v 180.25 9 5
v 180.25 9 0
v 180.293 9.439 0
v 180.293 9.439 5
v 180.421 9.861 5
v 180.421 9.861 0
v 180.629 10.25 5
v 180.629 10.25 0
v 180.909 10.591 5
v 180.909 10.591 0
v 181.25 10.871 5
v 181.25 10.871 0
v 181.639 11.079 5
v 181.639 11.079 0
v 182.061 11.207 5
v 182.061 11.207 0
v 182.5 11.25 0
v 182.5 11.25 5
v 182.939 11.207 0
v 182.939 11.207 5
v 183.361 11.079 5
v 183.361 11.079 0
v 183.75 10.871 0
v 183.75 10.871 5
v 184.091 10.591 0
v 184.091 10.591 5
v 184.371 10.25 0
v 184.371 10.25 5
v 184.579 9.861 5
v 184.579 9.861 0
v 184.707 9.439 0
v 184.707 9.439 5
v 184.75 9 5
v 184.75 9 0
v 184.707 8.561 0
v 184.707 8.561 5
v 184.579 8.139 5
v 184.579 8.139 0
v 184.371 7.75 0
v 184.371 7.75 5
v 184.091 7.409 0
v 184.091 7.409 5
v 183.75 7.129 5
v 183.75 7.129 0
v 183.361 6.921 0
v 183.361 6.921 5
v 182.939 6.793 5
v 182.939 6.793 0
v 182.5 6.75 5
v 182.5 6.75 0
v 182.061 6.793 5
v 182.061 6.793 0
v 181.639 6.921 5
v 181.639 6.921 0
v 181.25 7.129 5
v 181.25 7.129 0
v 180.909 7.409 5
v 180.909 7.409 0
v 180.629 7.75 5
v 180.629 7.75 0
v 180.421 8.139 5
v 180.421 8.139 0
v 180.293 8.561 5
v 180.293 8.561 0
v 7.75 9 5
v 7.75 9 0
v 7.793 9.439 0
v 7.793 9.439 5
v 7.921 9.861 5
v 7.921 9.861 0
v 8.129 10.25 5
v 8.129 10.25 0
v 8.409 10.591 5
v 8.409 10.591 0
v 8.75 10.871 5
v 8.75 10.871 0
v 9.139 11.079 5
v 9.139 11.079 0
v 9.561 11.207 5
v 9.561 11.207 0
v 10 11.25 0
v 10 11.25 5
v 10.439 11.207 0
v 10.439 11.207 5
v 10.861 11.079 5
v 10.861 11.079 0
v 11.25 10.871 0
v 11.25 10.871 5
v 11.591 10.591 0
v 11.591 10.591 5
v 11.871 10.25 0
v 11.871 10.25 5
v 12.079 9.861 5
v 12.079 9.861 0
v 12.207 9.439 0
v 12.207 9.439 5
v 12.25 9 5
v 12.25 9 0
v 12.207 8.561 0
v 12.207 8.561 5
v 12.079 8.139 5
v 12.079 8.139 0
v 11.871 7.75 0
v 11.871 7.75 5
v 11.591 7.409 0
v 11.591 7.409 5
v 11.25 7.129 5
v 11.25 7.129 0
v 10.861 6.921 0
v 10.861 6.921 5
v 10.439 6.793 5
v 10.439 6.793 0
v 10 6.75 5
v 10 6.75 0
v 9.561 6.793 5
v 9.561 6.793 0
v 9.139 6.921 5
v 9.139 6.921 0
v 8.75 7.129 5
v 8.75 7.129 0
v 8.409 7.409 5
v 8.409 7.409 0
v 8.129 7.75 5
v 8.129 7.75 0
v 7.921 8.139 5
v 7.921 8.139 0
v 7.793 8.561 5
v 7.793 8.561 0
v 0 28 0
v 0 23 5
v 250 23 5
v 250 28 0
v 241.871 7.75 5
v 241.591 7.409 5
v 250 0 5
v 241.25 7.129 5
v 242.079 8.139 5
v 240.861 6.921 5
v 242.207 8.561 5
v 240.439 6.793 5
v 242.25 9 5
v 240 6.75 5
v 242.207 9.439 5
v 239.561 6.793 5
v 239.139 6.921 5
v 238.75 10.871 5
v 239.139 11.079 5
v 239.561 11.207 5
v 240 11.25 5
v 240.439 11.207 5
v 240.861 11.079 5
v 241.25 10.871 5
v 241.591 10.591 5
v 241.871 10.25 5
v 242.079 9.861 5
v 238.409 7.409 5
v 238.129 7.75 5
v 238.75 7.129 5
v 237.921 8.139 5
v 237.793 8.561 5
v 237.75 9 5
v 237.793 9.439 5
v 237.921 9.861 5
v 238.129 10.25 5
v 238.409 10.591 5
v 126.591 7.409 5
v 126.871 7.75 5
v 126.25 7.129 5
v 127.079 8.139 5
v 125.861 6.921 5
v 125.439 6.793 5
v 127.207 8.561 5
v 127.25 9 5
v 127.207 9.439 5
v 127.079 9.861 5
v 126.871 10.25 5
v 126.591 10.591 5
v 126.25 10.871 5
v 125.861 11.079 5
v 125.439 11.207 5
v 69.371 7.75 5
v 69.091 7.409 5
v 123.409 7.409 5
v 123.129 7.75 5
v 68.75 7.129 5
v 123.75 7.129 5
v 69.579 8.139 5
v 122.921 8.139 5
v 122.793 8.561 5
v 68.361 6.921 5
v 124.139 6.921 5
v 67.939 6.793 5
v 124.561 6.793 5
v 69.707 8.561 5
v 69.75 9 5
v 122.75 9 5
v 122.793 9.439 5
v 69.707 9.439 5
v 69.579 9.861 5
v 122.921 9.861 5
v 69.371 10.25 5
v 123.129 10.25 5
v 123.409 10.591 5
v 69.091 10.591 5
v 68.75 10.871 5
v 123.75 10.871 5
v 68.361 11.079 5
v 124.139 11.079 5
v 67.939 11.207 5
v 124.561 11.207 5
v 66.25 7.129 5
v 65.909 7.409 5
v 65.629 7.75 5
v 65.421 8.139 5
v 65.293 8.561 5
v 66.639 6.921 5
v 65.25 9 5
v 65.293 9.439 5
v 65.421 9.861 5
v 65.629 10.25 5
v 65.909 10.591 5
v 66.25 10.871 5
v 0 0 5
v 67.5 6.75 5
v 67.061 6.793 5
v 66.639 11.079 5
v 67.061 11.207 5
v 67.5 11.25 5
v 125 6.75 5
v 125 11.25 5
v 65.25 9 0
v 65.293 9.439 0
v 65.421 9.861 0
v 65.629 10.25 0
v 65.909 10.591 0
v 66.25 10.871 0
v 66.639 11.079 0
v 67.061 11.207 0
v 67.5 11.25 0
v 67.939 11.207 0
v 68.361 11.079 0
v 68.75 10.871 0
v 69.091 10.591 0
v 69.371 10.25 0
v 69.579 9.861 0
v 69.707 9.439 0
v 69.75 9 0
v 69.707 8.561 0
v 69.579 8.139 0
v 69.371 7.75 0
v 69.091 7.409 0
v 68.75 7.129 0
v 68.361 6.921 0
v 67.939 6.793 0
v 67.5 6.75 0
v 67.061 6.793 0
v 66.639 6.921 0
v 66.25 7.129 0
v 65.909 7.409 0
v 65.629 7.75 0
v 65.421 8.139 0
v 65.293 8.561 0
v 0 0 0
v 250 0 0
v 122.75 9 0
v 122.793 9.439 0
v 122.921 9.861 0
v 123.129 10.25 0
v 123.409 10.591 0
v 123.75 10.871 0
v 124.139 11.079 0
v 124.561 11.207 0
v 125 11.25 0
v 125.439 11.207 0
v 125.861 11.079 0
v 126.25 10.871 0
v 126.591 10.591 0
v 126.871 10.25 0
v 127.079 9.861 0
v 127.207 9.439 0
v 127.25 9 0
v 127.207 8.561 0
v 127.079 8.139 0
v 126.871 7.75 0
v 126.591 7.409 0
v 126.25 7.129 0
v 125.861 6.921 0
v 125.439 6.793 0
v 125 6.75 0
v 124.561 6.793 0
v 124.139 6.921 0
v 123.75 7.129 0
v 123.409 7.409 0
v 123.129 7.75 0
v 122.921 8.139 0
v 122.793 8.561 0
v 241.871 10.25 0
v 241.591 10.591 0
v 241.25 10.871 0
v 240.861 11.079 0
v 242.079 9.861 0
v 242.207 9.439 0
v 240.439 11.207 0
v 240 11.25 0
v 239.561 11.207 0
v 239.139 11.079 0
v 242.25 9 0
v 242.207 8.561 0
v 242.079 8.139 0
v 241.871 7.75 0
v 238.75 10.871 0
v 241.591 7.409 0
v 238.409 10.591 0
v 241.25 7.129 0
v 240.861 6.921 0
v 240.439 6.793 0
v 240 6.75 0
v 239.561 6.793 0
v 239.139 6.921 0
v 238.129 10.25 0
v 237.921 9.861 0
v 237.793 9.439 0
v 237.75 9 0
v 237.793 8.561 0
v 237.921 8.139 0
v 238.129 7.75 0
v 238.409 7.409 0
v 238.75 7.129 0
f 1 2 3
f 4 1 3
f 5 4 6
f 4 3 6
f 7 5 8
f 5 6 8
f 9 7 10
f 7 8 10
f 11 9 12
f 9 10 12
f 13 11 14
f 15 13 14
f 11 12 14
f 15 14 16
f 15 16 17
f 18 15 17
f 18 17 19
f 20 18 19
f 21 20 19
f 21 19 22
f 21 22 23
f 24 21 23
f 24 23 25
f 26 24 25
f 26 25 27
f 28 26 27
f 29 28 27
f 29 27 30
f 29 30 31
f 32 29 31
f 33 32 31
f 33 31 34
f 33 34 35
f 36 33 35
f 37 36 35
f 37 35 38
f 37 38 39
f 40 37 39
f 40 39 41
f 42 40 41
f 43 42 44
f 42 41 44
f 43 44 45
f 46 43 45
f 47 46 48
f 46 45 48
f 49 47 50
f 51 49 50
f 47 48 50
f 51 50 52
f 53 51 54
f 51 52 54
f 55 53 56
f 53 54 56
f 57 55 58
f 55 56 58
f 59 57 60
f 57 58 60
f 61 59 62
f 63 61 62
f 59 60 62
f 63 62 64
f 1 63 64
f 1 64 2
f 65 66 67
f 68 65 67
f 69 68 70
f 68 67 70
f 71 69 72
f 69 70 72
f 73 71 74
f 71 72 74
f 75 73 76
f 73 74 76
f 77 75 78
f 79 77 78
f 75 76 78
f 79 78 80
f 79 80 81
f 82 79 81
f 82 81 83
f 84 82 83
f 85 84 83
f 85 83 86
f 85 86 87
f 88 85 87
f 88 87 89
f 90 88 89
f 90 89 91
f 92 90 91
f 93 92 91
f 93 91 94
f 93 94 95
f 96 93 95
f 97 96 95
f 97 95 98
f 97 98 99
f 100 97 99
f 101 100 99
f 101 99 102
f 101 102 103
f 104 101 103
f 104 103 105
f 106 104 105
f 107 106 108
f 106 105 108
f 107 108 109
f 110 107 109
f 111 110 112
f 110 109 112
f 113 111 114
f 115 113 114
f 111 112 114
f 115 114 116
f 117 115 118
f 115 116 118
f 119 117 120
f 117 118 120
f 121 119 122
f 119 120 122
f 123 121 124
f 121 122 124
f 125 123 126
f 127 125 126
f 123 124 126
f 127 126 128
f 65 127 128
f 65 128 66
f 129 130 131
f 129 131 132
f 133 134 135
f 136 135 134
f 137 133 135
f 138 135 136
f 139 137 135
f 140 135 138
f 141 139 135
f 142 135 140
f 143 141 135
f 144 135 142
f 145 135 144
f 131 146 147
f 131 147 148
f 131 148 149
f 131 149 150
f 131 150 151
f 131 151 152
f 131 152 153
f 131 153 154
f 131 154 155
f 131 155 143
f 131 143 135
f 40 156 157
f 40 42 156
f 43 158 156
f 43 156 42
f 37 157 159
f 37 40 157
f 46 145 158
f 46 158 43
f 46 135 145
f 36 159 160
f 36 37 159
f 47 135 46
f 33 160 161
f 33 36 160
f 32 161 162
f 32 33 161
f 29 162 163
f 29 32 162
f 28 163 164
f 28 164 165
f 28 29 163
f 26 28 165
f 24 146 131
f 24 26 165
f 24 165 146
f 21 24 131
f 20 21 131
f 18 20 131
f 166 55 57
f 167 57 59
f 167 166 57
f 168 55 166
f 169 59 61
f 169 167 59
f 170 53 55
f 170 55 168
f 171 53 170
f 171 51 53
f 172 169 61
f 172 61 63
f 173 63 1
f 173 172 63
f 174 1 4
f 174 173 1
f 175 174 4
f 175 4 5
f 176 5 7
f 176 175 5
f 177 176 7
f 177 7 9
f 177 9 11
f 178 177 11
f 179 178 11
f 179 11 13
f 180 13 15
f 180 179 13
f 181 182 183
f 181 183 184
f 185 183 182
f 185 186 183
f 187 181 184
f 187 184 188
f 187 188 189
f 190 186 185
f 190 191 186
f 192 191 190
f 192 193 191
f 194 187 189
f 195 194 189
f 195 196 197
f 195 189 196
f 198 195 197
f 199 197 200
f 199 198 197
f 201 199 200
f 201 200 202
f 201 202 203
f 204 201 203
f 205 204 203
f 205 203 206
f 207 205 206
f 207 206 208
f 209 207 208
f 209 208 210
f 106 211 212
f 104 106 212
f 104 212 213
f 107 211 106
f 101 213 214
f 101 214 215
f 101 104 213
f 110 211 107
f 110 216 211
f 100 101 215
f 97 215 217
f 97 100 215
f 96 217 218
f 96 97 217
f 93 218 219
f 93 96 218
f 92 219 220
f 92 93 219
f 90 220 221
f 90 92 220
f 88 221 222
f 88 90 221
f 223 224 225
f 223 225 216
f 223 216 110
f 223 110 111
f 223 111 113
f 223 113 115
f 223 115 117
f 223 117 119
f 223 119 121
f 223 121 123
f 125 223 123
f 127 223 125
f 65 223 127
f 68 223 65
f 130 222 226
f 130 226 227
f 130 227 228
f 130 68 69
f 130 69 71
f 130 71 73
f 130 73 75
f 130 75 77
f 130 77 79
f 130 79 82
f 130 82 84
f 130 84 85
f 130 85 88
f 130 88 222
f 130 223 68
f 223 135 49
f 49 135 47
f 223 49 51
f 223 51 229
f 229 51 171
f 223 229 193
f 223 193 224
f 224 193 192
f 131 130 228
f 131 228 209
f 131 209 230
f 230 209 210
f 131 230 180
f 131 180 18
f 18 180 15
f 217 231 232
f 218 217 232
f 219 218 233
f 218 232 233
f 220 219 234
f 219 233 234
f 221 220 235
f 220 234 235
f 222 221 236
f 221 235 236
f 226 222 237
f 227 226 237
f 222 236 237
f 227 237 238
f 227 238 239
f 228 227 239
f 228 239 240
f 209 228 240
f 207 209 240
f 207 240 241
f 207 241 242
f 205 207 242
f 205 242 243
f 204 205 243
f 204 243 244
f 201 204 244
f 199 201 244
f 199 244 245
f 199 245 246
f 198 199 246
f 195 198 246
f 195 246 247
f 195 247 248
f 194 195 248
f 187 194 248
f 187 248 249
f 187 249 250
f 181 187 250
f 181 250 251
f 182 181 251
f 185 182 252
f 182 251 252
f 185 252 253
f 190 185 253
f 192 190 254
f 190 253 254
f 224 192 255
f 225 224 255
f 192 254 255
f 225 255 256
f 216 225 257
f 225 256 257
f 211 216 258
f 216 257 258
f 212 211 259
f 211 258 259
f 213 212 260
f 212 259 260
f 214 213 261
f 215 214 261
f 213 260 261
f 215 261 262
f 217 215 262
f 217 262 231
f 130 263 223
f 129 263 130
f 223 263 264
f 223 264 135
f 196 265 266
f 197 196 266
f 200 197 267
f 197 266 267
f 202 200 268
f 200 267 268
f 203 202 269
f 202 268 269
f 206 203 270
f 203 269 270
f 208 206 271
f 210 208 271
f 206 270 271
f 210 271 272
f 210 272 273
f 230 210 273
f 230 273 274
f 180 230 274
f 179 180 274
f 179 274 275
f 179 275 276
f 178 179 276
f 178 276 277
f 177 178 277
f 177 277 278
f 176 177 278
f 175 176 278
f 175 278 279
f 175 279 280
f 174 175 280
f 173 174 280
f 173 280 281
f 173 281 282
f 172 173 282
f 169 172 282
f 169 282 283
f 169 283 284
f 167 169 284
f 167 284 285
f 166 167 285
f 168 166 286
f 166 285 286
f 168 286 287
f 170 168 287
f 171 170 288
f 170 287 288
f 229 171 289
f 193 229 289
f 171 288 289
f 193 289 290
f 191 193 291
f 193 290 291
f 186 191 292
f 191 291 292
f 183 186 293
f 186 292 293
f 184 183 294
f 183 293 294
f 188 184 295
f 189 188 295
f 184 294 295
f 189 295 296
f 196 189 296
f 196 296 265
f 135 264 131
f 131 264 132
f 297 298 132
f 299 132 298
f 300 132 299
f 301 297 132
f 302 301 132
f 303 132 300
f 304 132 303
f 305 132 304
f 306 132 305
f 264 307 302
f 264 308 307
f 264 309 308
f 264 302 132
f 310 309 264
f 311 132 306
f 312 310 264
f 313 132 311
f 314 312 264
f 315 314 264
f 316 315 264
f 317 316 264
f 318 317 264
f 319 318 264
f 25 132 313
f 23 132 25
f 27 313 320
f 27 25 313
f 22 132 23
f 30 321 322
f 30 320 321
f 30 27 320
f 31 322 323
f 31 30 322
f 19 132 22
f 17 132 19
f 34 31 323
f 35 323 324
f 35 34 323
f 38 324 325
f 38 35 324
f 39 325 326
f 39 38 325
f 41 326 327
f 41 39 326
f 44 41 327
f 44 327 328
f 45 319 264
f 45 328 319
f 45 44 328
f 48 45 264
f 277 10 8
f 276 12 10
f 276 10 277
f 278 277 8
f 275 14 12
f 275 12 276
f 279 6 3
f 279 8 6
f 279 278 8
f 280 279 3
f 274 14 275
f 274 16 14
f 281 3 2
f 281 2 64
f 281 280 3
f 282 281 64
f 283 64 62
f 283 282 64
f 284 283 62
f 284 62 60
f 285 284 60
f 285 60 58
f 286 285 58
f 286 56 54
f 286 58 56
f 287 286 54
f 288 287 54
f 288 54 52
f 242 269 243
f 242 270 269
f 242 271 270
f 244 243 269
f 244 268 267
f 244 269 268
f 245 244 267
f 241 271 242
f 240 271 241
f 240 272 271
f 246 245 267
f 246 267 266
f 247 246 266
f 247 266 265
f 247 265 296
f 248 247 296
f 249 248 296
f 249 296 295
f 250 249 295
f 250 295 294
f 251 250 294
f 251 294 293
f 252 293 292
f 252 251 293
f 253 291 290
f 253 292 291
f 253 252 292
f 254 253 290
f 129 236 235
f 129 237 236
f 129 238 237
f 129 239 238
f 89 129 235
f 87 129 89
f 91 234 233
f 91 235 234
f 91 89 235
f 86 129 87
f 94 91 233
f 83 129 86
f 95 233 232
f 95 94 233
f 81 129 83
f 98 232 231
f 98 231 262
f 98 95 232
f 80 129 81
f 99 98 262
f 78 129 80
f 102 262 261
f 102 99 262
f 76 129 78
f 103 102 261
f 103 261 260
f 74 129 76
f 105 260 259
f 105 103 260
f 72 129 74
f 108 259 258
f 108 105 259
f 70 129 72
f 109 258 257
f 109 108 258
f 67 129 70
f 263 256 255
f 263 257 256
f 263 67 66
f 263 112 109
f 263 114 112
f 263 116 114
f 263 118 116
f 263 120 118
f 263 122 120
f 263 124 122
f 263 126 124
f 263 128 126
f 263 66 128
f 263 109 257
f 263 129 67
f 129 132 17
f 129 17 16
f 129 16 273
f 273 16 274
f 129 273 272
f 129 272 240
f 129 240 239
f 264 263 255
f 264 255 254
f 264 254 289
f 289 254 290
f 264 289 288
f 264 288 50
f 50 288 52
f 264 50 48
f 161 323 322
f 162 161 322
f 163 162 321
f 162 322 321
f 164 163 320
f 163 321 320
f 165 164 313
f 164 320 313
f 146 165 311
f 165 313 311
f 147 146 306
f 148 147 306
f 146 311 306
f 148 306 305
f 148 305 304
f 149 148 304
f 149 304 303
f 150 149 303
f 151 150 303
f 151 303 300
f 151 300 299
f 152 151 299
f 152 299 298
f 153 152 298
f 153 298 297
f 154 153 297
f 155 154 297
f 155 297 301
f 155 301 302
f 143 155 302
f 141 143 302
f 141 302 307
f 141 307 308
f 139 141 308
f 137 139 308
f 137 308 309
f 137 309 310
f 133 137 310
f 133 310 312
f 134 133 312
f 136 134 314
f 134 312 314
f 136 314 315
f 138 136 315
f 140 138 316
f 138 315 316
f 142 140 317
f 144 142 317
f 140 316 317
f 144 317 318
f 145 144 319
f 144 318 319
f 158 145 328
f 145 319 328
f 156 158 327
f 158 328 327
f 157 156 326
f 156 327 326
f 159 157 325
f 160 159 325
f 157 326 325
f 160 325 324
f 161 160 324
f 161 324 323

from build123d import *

# Parameters (mm, degrees)
BOSS_EXTRUDE1_DEPTH  = 250
M4_CLEARANCE_HOLE1_D = 4.5
LPATTERN1_COUNT      = 5
LPATTERN1_PITCH      = 57.5


with BuildPart() as part:
    # Sketch1 → Boss-Extrude1 (new body)
    with BuildSketch(Plane(origin=(0, 0, 0), x_dir=(0, 0, -1), z_dir=(1, 0, 0))):
        Polygon((-5, 23), (0, 28), (0, 0), (-5, 0), align=None)
    extrude(amount=BOSS_EXTRUDE1_DEPTH)

    # M4 Clearance Hole1 (through all)
    with Locations(Plane.XY.offset(5)):
        with Locations((10, 9)):
            m4_clearance_hole1 = Hole(M4_CLEARANCE_HOLE1_D / 2)

    # LPattern1: M4 Clearance Hole1 ×5
    with Locations(*[(i * LPATTERN1_PITCH, 0, 0) for i in range(1, LPATTERN1_COUNT)]):
        add(m4_clearance_hole1, mode=Mode.SUBTRACT)


solid = part.part
